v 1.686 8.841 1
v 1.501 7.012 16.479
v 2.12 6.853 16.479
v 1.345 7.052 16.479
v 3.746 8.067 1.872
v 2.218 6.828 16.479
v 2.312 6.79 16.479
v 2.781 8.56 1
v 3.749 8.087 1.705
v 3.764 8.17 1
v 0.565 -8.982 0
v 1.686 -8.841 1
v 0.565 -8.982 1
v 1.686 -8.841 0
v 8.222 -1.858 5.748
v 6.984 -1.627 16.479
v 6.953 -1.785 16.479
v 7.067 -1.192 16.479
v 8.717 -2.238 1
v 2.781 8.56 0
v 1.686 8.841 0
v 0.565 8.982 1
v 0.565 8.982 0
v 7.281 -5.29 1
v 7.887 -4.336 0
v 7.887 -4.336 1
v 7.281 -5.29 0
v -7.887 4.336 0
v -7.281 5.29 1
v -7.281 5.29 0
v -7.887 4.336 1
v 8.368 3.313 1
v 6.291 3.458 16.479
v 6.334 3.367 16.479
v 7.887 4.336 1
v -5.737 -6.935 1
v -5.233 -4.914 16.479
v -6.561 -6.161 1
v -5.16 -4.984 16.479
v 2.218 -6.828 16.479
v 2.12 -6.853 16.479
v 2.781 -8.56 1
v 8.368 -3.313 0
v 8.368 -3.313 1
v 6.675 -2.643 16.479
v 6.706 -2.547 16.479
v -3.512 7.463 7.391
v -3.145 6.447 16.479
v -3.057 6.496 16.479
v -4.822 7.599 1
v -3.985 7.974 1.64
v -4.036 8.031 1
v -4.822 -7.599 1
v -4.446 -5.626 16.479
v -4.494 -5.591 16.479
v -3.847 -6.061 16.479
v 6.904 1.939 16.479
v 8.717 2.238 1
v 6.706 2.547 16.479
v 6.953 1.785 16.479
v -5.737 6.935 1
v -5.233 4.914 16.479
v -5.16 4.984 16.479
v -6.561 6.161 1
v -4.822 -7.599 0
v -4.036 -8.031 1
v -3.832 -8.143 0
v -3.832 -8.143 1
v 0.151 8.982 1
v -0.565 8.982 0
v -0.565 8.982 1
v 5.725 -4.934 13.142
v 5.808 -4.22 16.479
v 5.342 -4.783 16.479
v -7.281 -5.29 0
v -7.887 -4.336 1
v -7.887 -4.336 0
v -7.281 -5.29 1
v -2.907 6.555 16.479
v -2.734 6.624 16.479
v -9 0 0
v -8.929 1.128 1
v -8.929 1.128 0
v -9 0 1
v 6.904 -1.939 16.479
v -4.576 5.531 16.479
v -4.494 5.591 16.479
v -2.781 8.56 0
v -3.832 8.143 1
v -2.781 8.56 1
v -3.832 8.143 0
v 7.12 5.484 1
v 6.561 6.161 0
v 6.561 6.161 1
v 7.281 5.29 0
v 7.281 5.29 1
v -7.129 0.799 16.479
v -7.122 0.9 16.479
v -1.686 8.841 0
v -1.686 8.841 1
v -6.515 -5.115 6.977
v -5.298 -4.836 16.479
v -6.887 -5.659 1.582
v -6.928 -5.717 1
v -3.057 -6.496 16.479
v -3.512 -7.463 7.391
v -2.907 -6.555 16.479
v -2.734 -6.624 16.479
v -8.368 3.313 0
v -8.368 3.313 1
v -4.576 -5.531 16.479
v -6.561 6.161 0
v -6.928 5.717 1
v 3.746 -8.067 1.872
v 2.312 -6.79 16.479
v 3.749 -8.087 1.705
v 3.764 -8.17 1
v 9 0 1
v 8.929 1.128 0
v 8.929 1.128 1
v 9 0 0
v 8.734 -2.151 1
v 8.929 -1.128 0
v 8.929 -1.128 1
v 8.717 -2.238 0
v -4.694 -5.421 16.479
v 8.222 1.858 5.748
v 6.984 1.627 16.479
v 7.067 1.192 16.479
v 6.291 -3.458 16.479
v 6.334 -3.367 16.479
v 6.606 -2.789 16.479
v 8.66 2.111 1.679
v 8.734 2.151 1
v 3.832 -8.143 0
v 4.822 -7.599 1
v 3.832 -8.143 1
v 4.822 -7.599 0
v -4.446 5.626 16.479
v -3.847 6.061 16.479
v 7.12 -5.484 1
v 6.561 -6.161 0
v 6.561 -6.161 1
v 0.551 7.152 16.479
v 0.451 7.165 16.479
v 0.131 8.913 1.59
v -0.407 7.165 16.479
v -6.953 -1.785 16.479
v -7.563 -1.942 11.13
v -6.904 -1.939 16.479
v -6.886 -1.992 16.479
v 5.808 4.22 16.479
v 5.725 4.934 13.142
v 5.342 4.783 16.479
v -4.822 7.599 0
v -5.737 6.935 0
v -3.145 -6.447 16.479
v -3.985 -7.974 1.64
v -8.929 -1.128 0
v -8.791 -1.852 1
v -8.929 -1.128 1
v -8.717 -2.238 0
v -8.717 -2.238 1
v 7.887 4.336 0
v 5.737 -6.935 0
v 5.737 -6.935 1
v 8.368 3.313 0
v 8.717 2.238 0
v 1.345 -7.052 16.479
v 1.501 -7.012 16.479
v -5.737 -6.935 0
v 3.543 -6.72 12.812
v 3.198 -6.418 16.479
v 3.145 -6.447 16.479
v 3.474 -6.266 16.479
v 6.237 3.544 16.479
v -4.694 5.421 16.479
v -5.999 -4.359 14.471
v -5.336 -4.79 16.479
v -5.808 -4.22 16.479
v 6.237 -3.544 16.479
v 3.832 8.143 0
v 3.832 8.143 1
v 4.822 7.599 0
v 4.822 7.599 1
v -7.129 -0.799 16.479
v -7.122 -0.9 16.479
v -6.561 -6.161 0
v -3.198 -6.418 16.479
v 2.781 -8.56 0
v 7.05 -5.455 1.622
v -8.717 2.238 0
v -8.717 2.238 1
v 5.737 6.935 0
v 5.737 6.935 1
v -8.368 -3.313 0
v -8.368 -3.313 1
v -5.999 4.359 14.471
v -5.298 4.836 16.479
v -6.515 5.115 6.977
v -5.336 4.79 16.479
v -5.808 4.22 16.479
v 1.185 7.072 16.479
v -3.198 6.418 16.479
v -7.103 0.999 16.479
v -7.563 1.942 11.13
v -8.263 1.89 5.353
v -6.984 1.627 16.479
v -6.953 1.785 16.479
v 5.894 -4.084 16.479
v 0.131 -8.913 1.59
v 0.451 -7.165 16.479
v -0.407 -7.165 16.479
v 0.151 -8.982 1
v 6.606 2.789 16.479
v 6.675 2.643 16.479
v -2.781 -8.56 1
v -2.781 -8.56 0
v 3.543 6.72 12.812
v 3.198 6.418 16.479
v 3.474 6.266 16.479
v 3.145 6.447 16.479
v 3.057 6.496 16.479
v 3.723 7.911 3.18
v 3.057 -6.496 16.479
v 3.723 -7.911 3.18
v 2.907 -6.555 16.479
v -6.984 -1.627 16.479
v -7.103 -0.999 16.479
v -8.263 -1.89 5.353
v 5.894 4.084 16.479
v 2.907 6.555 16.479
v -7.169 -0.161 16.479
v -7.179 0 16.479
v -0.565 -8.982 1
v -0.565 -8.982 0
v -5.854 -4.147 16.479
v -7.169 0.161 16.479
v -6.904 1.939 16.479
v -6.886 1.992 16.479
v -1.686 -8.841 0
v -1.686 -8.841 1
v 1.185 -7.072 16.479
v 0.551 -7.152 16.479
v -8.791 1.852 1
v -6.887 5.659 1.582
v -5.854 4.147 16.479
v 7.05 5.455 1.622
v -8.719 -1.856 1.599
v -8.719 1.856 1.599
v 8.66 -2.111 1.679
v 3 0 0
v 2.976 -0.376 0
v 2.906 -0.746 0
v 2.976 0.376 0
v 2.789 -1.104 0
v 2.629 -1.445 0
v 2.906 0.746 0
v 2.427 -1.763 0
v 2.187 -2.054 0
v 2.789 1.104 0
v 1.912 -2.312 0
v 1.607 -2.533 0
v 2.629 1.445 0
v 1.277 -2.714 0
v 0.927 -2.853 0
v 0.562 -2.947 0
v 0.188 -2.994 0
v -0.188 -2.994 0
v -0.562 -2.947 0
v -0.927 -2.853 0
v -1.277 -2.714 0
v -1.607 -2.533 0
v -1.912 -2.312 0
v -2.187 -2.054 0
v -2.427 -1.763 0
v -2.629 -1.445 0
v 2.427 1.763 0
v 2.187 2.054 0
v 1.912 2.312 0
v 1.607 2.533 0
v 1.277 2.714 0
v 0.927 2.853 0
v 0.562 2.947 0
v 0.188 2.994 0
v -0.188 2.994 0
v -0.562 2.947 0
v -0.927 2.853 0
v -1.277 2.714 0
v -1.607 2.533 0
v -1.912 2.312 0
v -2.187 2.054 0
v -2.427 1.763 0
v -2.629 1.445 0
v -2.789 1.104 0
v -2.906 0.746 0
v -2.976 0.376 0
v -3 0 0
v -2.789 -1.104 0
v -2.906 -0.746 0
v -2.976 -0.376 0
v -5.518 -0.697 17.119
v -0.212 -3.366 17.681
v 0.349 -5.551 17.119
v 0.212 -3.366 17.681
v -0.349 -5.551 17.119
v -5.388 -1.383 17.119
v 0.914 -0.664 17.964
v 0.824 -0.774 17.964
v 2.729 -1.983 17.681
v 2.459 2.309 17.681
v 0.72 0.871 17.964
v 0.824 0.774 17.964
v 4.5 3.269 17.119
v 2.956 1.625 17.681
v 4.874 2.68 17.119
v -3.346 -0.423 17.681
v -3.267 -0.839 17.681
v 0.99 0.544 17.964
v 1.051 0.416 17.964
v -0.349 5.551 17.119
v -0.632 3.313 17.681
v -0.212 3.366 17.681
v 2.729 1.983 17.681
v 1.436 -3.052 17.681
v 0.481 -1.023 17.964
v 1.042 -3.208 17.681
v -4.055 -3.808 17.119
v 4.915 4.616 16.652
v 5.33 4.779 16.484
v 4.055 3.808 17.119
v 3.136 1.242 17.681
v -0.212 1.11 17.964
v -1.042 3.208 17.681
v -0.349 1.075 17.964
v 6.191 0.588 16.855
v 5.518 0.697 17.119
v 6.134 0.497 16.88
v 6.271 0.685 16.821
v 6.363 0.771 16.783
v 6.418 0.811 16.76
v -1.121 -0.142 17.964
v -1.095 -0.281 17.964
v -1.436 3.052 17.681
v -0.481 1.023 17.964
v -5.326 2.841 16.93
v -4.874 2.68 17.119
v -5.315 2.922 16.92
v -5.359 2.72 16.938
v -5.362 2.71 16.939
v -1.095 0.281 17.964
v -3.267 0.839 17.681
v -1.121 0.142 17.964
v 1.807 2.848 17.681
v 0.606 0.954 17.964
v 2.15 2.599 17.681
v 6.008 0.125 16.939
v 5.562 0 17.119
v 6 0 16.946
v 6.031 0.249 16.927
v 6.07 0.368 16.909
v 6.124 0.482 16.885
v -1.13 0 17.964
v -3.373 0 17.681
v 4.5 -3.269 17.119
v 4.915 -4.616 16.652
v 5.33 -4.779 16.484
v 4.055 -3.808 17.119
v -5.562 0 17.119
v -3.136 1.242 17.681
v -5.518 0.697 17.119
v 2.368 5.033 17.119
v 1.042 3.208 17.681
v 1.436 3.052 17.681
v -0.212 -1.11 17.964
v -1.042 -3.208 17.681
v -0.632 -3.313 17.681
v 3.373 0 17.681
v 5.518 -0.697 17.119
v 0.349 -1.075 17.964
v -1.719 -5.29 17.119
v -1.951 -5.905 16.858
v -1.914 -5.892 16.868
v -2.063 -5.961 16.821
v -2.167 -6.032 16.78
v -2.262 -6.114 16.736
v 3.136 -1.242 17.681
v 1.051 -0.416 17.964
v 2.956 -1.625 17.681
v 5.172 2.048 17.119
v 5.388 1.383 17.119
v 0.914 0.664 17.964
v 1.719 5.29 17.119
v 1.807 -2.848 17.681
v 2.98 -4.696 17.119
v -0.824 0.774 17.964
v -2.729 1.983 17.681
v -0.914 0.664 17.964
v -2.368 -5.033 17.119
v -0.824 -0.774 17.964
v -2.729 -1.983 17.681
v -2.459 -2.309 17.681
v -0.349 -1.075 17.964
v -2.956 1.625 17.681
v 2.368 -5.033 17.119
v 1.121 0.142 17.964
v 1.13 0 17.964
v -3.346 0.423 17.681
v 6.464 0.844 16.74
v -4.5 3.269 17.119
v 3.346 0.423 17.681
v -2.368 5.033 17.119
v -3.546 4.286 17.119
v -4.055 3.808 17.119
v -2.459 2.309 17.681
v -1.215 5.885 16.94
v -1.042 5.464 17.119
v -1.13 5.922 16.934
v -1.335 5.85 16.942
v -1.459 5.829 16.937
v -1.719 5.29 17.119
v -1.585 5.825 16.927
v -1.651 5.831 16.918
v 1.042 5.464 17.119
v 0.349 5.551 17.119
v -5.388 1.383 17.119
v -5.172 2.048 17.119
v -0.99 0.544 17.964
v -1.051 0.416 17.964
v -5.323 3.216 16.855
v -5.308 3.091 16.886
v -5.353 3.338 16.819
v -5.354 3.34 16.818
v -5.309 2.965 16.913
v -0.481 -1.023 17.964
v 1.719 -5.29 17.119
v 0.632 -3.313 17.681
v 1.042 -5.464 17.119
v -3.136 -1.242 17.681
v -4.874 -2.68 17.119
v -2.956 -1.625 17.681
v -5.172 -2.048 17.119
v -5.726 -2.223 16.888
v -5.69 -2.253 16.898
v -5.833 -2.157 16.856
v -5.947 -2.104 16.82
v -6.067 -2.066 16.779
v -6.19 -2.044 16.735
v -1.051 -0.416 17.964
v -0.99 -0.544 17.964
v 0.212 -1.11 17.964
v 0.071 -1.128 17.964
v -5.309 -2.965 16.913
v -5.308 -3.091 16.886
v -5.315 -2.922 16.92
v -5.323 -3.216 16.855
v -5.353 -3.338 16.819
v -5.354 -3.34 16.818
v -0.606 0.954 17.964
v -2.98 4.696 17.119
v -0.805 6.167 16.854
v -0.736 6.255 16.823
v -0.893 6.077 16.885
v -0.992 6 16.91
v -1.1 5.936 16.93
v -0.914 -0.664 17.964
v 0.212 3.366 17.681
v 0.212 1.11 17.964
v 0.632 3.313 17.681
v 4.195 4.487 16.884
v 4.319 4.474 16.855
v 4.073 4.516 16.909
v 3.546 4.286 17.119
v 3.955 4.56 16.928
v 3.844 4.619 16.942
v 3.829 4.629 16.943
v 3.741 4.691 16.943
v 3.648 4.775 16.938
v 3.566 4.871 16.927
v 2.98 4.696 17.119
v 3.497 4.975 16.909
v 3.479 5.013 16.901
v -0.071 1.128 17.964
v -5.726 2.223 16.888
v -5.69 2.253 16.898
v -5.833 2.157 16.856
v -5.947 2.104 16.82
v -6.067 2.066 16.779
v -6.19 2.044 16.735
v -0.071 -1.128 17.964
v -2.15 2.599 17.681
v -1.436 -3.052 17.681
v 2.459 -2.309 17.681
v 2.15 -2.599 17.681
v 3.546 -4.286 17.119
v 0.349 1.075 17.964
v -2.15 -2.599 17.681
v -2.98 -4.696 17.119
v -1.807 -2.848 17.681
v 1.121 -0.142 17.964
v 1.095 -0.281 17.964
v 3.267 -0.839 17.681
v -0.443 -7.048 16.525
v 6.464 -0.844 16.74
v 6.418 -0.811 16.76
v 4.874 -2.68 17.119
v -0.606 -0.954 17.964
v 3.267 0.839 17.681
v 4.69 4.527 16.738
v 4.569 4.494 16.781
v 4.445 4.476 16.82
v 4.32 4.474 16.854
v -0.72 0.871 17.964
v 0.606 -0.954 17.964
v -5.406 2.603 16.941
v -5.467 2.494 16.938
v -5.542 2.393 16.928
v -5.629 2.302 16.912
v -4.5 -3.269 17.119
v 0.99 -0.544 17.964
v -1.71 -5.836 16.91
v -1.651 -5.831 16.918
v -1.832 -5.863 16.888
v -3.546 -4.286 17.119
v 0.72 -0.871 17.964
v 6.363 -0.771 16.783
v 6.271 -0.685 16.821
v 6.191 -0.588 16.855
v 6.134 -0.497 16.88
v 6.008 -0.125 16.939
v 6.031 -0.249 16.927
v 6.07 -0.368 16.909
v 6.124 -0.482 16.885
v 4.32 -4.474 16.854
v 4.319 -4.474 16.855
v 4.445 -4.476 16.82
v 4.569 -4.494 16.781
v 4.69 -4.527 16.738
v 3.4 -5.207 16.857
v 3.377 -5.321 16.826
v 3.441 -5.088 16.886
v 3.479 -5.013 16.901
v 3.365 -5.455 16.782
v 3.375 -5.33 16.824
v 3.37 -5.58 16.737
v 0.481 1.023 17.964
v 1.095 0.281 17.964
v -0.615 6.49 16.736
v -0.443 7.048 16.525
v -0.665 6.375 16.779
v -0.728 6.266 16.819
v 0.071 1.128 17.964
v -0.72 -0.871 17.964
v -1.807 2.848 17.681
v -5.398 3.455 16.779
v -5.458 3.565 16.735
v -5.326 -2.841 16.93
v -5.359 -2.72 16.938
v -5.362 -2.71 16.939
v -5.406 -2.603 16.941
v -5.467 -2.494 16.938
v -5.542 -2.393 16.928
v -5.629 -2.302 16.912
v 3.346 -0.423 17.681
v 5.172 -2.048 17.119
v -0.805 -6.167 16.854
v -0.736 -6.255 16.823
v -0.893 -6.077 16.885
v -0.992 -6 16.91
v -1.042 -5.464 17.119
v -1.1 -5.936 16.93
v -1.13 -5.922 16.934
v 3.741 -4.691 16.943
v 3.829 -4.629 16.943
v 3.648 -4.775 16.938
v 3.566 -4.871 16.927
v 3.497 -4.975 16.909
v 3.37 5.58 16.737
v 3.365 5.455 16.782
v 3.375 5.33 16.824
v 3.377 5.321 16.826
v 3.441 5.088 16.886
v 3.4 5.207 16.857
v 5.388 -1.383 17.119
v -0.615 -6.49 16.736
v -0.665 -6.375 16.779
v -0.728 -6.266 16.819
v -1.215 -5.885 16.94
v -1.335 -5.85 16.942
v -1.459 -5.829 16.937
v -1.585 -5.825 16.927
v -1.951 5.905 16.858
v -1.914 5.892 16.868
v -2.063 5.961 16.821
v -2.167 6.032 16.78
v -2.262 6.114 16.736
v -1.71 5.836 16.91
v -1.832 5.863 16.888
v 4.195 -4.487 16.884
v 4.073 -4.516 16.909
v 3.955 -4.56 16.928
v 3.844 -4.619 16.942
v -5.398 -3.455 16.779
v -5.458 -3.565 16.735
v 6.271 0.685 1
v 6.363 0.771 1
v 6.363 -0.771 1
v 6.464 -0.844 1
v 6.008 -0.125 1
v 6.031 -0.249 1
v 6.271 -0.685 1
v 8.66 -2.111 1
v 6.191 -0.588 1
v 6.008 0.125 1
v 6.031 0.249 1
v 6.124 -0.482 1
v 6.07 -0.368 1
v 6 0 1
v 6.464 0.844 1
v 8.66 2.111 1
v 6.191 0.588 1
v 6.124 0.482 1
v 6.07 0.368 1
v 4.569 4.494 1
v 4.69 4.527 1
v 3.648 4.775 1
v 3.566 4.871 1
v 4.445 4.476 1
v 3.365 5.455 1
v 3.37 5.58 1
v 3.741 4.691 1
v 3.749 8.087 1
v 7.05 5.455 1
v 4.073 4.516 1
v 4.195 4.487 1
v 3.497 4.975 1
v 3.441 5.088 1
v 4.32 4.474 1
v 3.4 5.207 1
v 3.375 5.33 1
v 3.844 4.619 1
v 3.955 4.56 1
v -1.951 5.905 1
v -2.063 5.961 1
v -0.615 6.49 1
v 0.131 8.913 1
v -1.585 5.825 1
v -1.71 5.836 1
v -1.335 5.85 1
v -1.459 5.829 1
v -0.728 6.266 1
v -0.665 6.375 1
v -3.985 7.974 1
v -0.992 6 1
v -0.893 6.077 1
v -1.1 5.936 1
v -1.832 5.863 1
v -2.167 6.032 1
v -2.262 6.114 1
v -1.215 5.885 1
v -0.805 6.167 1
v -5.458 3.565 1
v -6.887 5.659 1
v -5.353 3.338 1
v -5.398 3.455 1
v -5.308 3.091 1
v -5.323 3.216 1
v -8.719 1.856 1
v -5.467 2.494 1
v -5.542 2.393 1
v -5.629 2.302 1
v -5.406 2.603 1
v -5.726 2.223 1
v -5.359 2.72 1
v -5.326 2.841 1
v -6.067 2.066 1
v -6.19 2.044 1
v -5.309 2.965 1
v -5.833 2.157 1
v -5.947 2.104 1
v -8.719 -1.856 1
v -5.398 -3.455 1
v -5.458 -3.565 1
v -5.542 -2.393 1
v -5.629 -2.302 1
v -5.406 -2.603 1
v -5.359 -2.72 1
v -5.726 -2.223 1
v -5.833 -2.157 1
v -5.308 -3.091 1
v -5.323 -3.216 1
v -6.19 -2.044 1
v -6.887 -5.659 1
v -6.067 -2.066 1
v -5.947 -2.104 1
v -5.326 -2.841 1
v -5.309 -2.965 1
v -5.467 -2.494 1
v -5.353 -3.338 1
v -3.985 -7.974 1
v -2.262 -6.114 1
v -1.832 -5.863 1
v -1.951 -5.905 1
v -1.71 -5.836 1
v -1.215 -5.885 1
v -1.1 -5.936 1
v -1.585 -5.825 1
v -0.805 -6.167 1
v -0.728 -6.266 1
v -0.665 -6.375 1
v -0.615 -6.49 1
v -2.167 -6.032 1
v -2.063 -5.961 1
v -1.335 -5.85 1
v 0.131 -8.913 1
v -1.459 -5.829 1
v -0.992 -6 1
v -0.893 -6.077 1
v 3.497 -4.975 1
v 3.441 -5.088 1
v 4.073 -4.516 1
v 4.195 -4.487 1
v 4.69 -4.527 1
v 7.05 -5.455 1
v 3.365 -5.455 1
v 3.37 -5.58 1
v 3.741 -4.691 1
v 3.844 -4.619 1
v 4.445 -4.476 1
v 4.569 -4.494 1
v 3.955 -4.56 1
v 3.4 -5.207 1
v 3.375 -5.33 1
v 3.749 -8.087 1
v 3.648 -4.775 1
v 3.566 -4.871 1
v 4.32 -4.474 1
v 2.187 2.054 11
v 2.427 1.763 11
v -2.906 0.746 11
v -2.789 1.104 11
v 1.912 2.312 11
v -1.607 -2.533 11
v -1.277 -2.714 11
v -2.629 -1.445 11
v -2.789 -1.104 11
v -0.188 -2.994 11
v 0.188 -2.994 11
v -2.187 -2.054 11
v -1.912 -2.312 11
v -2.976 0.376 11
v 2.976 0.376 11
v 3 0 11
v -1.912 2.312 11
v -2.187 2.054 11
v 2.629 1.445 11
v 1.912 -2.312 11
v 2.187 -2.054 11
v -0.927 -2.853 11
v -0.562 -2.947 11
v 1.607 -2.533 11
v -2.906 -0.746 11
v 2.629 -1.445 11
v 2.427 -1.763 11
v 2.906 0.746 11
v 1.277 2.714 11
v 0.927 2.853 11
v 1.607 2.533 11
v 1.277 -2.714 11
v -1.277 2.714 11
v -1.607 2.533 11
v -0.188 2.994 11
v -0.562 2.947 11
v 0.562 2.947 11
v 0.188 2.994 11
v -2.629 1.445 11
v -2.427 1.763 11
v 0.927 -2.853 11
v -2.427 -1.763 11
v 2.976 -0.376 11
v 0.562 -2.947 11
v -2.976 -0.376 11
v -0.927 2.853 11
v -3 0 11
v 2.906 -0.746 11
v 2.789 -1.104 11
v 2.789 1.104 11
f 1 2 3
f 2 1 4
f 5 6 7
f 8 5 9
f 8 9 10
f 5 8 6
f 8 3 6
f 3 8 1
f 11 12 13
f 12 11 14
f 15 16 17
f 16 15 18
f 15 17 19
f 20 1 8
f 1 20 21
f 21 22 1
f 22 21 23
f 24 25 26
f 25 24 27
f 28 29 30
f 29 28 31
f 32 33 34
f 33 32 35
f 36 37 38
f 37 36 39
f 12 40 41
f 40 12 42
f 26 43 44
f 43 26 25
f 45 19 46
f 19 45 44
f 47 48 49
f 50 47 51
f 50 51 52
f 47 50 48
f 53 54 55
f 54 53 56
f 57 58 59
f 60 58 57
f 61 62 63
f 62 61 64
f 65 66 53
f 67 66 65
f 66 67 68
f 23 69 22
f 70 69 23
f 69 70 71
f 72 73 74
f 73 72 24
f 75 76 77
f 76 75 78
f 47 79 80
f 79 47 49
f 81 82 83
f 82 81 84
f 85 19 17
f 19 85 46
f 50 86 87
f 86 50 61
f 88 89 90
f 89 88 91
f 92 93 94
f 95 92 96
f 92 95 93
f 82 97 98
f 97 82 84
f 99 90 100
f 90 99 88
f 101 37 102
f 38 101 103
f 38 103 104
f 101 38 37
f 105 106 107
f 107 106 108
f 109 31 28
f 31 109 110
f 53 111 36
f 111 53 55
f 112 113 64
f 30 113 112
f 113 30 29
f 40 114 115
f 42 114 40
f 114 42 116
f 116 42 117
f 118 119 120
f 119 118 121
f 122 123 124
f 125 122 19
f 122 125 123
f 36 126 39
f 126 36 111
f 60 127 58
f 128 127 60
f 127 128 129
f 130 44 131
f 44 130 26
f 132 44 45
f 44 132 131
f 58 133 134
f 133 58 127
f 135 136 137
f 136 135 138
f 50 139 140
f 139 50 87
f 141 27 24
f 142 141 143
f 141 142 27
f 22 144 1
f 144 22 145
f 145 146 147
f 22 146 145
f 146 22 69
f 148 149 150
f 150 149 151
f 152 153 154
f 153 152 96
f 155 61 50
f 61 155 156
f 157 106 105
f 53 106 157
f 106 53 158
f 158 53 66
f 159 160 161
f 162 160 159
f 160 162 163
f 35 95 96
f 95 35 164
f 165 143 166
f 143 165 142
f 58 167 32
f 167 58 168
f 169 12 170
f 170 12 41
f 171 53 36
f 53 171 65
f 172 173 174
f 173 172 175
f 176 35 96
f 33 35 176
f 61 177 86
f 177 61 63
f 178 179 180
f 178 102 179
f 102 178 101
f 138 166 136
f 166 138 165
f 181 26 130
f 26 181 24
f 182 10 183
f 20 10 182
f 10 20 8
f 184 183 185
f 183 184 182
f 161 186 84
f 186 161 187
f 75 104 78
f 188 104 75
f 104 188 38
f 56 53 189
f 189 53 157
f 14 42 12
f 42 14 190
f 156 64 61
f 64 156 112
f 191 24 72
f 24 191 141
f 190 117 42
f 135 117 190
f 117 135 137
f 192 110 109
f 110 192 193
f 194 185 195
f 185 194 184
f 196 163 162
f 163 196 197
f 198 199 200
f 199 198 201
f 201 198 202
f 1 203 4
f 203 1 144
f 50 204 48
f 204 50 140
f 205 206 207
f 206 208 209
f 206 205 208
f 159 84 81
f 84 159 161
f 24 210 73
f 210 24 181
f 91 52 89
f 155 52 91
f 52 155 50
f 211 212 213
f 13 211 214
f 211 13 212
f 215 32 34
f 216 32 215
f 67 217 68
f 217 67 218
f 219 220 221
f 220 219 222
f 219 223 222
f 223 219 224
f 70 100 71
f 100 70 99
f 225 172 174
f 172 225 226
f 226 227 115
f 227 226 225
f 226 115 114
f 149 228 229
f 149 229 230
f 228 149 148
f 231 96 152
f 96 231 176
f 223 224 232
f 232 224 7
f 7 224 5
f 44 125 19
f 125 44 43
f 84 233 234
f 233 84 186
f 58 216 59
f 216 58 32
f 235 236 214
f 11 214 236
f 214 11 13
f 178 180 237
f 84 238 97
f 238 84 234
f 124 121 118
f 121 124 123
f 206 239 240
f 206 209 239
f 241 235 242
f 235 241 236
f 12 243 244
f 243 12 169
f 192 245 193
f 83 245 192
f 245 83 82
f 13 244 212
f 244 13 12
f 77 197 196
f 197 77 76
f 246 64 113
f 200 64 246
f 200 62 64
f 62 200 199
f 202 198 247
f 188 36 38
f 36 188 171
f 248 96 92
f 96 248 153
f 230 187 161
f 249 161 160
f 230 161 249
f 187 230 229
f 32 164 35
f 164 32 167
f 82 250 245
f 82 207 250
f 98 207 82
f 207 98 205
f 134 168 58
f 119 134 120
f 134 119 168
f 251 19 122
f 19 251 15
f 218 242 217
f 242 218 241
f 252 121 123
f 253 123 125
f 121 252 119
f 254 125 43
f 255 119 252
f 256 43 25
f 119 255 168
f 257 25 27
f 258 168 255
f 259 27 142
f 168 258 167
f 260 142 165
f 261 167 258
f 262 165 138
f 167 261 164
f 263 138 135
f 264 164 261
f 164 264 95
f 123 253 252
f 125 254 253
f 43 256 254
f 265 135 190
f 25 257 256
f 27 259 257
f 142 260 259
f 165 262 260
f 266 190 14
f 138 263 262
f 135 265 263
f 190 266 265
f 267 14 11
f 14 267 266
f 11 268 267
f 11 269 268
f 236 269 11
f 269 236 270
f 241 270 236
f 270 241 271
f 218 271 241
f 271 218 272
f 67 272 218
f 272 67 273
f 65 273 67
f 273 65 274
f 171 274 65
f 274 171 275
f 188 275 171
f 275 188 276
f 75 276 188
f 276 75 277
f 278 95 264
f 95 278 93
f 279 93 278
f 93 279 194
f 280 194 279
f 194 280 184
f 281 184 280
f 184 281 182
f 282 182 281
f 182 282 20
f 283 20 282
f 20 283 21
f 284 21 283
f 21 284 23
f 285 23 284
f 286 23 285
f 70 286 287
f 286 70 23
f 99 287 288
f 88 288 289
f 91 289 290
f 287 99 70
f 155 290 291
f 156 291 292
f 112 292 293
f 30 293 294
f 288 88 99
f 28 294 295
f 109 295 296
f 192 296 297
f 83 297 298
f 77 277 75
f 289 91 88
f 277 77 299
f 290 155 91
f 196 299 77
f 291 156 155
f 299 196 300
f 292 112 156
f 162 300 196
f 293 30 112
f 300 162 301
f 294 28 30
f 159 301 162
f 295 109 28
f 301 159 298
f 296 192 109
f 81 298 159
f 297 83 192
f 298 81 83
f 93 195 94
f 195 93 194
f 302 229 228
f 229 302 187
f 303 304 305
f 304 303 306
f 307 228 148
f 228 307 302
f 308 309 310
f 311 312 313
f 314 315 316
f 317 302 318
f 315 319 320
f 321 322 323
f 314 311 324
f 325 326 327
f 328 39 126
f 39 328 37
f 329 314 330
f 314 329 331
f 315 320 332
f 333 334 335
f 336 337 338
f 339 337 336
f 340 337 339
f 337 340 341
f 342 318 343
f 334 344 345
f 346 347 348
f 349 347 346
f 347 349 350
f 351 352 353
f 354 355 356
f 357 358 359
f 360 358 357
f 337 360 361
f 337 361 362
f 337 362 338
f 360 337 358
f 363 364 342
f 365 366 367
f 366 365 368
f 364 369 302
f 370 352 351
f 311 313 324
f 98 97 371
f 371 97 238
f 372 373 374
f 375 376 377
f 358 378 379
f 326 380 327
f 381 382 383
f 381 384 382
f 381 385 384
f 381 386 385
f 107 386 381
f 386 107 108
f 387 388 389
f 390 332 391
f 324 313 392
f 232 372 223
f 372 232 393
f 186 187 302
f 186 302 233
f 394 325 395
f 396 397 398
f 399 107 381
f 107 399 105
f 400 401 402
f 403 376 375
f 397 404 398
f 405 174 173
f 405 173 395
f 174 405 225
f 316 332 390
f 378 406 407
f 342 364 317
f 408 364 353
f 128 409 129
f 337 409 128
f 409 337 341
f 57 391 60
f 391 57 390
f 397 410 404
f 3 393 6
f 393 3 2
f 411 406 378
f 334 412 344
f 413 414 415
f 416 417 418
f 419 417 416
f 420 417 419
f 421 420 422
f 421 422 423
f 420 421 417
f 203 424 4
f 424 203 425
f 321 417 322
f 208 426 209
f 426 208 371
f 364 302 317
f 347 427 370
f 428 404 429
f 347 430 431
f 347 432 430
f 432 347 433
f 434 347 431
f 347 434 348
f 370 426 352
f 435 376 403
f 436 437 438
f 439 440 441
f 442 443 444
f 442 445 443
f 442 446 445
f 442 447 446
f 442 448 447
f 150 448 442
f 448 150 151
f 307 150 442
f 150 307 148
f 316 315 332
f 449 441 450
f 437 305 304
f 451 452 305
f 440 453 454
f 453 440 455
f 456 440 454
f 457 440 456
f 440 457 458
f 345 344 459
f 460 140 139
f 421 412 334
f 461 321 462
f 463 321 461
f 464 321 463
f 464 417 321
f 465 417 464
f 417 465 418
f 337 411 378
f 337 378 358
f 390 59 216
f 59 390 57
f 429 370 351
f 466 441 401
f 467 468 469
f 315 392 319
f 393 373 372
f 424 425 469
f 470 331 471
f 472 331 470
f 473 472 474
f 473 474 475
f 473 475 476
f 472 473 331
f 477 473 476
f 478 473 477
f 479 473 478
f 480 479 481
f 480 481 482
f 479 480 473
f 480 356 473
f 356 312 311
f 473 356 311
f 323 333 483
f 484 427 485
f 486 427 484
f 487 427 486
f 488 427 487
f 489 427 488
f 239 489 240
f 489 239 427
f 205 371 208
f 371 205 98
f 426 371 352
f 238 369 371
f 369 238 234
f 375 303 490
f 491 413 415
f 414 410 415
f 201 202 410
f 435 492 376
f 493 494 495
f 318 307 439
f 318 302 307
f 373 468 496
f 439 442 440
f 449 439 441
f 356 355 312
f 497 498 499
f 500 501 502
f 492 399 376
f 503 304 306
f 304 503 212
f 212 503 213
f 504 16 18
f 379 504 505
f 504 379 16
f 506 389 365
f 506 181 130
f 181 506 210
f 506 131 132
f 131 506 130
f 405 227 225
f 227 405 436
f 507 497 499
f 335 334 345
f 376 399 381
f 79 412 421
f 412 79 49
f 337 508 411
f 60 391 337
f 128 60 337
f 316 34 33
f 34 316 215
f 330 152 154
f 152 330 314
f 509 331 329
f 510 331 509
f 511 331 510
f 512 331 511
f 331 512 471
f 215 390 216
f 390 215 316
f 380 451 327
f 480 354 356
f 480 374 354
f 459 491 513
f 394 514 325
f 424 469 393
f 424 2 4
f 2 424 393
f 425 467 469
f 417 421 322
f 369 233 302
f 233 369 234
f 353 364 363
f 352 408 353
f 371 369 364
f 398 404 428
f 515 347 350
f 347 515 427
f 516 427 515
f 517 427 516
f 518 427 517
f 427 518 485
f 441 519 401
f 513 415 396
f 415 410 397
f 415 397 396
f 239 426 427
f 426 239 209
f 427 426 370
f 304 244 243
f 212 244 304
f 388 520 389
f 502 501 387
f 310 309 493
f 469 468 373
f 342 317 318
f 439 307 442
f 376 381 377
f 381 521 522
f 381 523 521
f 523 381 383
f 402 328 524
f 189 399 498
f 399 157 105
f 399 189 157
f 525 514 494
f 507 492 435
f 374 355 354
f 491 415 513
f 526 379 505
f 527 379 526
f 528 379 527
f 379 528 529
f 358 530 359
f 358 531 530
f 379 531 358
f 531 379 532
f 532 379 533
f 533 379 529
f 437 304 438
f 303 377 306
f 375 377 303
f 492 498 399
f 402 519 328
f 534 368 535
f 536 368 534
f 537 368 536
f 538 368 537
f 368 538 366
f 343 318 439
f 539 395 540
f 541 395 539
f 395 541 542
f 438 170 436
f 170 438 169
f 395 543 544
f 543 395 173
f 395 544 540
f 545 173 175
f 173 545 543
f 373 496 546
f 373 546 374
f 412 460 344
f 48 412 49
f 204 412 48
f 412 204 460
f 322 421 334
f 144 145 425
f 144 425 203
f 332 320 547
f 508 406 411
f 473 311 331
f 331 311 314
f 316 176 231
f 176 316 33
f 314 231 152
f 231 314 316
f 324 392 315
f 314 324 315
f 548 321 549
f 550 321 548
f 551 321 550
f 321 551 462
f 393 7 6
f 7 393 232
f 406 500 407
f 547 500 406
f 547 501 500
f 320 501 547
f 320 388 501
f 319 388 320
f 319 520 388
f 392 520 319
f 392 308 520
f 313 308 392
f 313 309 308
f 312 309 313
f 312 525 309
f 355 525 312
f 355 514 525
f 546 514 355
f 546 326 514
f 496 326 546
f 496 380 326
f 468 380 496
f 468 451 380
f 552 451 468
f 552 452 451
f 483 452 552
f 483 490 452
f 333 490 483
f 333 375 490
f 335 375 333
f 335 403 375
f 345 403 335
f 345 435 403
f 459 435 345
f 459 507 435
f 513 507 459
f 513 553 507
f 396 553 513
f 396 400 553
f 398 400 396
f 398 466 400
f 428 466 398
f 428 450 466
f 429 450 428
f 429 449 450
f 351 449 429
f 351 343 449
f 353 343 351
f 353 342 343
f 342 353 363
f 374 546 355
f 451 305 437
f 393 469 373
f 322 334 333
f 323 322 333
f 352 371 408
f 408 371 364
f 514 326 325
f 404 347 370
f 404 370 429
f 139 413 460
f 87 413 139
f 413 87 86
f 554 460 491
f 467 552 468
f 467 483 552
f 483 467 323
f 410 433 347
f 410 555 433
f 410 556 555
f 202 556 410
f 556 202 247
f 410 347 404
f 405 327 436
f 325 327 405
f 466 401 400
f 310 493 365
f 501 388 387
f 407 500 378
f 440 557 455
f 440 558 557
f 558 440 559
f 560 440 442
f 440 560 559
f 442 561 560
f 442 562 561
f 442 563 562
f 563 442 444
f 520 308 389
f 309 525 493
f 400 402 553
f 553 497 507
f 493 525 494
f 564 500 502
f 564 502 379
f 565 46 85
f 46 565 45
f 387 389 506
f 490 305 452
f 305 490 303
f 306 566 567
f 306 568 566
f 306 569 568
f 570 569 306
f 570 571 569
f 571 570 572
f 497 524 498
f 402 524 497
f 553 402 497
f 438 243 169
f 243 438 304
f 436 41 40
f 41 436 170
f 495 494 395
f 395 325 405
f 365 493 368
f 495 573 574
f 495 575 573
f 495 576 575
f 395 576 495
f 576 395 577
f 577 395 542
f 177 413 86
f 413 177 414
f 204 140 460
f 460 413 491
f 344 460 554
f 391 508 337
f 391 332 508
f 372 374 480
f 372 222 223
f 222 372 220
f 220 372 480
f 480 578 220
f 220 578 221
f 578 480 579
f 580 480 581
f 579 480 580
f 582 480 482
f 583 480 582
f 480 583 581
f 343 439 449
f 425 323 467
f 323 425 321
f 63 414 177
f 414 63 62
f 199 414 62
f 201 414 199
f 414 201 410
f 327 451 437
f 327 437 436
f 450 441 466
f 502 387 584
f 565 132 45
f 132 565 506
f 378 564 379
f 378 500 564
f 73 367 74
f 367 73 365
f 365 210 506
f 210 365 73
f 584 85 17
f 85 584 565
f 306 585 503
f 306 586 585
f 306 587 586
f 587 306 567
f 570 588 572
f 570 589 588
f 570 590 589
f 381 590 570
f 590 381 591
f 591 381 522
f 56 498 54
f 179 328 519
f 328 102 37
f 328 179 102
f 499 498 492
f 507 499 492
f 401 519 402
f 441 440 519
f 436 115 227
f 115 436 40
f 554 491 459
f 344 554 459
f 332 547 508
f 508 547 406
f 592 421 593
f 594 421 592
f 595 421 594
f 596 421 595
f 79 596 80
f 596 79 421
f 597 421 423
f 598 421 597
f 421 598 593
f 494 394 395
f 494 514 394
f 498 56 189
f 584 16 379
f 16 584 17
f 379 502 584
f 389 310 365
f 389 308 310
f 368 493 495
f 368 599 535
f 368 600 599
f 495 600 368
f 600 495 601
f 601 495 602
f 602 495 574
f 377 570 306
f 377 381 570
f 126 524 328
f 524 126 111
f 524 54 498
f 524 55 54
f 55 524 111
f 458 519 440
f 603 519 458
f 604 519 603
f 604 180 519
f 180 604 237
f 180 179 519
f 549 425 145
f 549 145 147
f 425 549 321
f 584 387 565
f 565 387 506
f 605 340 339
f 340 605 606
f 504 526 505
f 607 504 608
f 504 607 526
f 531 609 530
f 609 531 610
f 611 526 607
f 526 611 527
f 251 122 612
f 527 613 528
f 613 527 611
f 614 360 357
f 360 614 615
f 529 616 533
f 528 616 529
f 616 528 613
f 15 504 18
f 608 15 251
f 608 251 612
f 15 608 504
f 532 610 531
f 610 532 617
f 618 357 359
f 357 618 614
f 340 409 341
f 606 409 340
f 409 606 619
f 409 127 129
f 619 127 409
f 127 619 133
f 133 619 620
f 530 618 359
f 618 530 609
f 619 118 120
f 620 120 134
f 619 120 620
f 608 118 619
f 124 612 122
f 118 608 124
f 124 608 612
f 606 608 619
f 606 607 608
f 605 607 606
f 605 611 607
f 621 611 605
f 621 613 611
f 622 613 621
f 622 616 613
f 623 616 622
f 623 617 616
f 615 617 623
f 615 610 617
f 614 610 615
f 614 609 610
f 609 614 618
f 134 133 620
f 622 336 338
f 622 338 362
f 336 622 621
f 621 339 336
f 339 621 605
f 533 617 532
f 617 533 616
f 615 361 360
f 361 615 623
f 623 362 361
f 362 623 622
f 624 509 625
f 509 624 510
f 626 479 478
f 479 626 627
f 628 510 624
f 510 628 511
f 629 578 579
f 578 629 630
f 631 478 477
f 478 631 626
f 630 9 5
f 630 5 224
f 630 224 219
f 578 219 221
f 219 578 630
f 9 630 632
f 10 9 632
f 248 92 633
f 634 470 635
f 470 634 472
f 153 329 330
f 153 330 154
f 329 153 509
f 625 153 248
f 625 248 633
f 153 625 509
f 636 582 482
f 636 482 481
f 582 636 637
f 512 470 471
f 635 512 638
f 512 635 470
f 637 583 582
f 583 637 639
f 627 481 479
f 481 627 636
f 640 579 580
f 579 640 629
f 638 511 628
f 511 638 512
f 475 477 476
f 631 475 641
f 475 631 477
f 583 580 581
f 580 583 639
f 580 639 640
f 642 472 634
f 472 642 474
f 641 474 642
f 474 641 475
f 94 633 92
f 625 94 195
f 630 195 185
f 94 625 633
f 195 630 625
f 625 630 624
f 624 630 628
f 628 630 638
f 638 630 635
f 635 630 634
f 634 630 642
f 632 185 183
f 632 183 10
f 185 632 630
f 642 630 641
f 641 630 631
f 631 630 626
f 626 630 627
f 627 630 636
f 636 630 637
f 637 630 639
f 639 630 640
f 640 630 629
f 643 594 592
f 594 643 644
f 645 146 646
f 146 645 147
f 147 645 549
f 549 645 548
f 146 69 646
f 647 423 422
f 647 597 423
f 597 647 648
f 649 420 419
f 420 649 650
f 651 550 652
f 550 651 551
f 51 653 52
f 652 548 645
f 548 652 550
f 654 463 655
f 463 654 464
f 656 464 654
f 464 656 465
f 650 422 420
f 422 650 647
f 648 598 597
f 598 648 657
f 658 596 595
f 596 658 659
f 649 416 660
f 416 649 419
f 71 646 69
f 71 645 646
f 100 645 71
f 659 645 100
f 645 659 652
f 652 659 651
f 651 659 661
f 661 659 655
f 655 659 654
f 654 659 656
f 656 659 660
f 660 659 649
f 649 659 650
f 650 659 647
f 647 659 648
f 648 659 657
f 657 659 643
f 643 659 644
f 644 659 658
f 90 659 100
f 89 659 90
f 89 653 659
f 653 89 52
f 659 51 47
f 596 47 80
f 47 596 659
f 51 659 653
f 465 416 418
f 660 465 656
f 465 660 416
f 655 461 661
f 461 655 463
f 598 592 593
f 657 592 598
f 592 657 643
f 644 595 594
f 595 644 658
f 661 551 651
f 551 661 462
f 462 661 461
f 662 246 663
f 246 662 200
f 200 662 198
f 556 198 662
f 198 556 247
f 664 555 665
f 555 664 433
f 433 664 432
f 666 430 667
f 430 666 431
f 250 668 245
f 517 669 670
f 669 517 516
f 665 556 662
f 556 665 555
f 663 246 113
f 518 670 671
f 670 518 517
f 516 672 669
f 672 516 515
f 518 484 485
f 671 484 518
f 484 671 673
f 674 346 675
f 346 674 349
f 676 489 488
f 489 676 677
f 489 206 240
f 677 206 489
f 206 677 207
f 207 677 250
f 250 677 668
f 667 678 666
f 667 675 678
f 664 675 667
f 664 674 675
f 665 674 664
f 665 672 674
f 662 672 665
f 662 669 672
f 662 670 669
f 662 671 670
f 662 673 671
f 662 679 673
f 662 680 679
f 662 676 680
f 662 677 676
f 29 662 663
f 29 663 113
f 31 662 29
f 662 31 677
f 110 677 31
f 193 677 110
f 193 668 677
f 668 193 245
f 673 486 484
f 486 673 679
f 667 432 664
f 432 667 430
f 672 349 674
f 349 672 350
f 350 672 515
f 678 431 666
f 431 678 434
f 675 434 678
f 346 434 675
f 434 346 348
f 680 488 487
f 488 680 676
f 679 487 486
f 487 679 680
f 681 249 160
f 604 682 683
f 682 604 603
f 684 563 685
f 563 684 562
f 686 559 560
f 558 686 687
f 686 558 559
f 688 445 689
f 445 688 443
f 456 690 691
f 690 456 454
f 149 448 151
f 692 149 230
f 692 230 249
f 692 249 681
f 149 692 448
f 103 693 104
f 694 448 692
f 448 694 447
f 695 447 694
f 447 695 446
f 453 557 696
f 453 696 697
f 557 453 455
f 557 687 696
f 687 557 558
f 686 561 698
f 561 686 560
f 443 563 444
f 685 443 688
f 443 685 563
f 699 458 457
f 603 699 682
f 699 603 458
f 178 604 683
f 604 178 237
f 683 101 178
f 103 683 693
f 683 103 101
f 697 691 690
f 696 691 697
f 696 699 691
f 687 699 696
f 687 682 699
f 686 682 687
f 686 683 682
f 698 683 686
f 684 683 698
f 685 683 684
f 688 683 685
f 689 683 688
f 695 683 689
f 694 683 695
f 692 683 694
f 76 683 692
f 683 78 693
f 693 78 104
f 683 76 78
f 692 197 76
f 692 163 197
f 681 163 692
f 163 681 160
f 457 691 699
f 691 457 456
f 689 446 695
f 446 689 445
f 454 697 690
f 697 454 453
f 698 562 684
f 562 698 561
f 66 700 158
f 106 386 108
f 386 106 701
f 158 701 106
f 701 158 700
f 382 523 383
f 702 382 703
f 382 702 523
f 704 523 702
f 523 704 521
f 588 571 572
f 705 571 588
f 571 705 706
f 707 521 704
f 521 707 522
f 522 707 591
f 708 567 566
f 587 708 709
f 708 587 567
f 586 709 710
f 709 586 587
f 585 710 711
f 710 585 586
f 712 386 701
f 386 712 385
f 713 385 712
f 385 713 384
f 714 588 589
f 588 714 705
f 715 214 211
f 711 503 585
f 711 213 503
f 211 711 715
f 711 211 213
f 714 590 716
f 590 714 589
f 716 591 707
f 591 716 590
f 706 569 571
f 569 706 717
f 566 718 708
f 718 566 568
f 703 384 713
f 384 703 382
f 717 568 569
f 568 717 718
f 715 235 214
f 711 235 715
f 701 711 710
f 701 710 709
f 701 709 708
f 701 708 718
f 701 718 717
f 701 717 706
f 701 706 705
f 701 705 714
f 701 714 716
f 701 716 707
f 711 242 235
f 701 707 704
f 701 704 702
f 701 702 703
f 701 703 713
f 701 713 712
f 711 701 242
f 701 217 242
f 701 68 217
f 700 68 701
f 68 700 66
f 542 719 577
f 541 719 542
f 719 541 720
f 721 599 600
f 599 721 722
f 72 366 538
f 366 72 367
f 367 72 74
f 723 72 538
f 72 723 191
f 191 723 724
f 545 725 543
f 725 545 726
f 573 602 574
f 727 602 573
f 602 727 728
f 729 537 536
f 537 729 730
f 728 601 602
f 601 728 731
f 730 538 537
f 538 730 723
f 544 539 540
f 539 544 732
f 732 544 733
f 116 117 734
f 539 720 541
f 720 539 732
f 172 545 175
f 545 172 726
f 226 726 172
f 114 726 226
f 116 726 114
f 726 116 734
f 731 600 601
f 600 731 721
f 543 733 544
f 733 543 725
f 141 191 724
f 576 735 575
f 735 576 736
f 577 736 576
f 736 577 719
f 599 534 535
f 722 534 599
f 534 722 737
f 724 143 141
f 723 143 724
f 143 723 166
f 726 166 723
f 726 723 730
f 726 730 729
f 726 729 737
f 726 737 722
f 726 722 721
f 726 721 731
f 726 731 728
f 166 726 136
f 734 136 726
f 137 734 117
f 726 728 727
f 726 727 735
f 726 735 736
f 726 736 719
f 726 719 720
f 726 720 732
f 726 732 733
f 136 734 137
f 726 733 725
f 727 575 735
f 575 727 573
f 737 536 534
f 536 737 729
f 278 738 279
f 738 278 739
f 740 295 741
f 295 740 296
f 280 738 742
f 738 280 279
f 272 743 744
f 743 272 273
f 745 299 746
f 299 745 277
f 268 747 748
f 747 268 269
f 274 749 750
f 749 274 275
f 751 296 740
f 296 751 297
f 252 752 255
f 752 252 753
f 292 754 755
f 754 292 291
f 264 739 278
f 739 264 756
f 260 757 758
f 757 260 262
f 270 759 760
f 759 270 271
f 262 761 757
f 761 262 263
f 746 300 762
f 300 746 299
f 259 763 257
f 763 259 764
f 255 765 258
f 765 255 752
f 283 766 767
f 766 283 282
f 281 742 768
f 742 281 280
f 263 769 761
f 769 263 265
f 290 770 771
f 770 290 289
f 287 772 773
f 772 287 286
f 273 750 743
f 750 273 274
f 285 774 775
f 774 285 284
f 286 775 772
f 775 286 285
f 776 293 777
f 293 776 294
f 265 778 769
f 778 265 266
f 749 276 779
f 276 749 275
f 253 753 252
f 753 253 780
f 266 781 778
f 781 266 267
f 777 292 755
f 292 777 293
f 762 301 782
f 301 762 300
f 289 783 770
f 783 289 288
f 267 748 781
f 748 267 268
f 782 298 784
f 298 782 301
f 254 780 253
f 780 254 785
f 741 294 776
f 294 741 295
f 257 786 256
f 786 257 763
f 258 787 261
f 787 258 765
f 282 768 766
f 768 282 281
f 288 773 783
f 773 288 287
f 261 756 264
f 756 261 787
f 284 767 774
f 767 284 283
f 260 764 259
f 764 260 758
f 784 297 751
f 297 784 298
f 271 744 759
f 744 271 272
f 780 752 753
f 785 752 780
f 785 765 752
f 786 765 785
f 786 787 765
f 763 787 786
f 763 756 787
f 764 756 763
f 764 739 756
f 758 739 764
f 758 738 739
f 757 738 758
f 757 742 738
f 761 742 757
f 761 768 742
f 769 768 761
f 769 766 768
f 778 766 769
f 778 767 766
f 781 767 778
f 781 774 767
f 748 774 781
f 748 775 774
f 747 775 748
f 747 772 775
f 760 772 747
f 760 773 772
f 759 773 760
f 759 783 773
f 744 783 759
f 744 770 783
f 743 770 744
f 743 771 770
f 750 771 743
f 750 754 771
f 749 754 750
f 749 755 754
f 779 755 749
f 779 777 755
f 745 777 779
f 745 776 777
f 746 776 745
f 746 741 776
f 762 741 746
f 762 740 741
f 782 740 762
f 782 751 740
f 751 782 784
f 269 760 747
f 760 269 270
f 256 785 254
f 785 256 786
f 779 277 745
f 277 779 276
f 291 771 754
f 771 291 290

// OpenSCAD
$fn=50; //smoothness

radius=9;
height=18;
numteeth=7;
pivotDiameter=6;
pivotHeight=11;
difference(){
    intersection(){
    hull(){
        cylinder(r=radius,h=1);
        translate([0,0,height-1])cylinder(r=radius-2,h=1);
    }
    sphere(height);
    }
    union(){
        translate([0,0,-1]) cylinder(r=pivotDiameter/2,h=pivotHeight+1);
        for (i=[0:numteeth]){
        rotate(a=360/numteeth*i,v=[0,0,1]) hull(){
            translate([radius+1,0,1]) cylinder(r=2.5,h=height+2);
            translate([radius-2,0,1]) cylinder(r=1,h=height+2);
        }
        }
    }
}
